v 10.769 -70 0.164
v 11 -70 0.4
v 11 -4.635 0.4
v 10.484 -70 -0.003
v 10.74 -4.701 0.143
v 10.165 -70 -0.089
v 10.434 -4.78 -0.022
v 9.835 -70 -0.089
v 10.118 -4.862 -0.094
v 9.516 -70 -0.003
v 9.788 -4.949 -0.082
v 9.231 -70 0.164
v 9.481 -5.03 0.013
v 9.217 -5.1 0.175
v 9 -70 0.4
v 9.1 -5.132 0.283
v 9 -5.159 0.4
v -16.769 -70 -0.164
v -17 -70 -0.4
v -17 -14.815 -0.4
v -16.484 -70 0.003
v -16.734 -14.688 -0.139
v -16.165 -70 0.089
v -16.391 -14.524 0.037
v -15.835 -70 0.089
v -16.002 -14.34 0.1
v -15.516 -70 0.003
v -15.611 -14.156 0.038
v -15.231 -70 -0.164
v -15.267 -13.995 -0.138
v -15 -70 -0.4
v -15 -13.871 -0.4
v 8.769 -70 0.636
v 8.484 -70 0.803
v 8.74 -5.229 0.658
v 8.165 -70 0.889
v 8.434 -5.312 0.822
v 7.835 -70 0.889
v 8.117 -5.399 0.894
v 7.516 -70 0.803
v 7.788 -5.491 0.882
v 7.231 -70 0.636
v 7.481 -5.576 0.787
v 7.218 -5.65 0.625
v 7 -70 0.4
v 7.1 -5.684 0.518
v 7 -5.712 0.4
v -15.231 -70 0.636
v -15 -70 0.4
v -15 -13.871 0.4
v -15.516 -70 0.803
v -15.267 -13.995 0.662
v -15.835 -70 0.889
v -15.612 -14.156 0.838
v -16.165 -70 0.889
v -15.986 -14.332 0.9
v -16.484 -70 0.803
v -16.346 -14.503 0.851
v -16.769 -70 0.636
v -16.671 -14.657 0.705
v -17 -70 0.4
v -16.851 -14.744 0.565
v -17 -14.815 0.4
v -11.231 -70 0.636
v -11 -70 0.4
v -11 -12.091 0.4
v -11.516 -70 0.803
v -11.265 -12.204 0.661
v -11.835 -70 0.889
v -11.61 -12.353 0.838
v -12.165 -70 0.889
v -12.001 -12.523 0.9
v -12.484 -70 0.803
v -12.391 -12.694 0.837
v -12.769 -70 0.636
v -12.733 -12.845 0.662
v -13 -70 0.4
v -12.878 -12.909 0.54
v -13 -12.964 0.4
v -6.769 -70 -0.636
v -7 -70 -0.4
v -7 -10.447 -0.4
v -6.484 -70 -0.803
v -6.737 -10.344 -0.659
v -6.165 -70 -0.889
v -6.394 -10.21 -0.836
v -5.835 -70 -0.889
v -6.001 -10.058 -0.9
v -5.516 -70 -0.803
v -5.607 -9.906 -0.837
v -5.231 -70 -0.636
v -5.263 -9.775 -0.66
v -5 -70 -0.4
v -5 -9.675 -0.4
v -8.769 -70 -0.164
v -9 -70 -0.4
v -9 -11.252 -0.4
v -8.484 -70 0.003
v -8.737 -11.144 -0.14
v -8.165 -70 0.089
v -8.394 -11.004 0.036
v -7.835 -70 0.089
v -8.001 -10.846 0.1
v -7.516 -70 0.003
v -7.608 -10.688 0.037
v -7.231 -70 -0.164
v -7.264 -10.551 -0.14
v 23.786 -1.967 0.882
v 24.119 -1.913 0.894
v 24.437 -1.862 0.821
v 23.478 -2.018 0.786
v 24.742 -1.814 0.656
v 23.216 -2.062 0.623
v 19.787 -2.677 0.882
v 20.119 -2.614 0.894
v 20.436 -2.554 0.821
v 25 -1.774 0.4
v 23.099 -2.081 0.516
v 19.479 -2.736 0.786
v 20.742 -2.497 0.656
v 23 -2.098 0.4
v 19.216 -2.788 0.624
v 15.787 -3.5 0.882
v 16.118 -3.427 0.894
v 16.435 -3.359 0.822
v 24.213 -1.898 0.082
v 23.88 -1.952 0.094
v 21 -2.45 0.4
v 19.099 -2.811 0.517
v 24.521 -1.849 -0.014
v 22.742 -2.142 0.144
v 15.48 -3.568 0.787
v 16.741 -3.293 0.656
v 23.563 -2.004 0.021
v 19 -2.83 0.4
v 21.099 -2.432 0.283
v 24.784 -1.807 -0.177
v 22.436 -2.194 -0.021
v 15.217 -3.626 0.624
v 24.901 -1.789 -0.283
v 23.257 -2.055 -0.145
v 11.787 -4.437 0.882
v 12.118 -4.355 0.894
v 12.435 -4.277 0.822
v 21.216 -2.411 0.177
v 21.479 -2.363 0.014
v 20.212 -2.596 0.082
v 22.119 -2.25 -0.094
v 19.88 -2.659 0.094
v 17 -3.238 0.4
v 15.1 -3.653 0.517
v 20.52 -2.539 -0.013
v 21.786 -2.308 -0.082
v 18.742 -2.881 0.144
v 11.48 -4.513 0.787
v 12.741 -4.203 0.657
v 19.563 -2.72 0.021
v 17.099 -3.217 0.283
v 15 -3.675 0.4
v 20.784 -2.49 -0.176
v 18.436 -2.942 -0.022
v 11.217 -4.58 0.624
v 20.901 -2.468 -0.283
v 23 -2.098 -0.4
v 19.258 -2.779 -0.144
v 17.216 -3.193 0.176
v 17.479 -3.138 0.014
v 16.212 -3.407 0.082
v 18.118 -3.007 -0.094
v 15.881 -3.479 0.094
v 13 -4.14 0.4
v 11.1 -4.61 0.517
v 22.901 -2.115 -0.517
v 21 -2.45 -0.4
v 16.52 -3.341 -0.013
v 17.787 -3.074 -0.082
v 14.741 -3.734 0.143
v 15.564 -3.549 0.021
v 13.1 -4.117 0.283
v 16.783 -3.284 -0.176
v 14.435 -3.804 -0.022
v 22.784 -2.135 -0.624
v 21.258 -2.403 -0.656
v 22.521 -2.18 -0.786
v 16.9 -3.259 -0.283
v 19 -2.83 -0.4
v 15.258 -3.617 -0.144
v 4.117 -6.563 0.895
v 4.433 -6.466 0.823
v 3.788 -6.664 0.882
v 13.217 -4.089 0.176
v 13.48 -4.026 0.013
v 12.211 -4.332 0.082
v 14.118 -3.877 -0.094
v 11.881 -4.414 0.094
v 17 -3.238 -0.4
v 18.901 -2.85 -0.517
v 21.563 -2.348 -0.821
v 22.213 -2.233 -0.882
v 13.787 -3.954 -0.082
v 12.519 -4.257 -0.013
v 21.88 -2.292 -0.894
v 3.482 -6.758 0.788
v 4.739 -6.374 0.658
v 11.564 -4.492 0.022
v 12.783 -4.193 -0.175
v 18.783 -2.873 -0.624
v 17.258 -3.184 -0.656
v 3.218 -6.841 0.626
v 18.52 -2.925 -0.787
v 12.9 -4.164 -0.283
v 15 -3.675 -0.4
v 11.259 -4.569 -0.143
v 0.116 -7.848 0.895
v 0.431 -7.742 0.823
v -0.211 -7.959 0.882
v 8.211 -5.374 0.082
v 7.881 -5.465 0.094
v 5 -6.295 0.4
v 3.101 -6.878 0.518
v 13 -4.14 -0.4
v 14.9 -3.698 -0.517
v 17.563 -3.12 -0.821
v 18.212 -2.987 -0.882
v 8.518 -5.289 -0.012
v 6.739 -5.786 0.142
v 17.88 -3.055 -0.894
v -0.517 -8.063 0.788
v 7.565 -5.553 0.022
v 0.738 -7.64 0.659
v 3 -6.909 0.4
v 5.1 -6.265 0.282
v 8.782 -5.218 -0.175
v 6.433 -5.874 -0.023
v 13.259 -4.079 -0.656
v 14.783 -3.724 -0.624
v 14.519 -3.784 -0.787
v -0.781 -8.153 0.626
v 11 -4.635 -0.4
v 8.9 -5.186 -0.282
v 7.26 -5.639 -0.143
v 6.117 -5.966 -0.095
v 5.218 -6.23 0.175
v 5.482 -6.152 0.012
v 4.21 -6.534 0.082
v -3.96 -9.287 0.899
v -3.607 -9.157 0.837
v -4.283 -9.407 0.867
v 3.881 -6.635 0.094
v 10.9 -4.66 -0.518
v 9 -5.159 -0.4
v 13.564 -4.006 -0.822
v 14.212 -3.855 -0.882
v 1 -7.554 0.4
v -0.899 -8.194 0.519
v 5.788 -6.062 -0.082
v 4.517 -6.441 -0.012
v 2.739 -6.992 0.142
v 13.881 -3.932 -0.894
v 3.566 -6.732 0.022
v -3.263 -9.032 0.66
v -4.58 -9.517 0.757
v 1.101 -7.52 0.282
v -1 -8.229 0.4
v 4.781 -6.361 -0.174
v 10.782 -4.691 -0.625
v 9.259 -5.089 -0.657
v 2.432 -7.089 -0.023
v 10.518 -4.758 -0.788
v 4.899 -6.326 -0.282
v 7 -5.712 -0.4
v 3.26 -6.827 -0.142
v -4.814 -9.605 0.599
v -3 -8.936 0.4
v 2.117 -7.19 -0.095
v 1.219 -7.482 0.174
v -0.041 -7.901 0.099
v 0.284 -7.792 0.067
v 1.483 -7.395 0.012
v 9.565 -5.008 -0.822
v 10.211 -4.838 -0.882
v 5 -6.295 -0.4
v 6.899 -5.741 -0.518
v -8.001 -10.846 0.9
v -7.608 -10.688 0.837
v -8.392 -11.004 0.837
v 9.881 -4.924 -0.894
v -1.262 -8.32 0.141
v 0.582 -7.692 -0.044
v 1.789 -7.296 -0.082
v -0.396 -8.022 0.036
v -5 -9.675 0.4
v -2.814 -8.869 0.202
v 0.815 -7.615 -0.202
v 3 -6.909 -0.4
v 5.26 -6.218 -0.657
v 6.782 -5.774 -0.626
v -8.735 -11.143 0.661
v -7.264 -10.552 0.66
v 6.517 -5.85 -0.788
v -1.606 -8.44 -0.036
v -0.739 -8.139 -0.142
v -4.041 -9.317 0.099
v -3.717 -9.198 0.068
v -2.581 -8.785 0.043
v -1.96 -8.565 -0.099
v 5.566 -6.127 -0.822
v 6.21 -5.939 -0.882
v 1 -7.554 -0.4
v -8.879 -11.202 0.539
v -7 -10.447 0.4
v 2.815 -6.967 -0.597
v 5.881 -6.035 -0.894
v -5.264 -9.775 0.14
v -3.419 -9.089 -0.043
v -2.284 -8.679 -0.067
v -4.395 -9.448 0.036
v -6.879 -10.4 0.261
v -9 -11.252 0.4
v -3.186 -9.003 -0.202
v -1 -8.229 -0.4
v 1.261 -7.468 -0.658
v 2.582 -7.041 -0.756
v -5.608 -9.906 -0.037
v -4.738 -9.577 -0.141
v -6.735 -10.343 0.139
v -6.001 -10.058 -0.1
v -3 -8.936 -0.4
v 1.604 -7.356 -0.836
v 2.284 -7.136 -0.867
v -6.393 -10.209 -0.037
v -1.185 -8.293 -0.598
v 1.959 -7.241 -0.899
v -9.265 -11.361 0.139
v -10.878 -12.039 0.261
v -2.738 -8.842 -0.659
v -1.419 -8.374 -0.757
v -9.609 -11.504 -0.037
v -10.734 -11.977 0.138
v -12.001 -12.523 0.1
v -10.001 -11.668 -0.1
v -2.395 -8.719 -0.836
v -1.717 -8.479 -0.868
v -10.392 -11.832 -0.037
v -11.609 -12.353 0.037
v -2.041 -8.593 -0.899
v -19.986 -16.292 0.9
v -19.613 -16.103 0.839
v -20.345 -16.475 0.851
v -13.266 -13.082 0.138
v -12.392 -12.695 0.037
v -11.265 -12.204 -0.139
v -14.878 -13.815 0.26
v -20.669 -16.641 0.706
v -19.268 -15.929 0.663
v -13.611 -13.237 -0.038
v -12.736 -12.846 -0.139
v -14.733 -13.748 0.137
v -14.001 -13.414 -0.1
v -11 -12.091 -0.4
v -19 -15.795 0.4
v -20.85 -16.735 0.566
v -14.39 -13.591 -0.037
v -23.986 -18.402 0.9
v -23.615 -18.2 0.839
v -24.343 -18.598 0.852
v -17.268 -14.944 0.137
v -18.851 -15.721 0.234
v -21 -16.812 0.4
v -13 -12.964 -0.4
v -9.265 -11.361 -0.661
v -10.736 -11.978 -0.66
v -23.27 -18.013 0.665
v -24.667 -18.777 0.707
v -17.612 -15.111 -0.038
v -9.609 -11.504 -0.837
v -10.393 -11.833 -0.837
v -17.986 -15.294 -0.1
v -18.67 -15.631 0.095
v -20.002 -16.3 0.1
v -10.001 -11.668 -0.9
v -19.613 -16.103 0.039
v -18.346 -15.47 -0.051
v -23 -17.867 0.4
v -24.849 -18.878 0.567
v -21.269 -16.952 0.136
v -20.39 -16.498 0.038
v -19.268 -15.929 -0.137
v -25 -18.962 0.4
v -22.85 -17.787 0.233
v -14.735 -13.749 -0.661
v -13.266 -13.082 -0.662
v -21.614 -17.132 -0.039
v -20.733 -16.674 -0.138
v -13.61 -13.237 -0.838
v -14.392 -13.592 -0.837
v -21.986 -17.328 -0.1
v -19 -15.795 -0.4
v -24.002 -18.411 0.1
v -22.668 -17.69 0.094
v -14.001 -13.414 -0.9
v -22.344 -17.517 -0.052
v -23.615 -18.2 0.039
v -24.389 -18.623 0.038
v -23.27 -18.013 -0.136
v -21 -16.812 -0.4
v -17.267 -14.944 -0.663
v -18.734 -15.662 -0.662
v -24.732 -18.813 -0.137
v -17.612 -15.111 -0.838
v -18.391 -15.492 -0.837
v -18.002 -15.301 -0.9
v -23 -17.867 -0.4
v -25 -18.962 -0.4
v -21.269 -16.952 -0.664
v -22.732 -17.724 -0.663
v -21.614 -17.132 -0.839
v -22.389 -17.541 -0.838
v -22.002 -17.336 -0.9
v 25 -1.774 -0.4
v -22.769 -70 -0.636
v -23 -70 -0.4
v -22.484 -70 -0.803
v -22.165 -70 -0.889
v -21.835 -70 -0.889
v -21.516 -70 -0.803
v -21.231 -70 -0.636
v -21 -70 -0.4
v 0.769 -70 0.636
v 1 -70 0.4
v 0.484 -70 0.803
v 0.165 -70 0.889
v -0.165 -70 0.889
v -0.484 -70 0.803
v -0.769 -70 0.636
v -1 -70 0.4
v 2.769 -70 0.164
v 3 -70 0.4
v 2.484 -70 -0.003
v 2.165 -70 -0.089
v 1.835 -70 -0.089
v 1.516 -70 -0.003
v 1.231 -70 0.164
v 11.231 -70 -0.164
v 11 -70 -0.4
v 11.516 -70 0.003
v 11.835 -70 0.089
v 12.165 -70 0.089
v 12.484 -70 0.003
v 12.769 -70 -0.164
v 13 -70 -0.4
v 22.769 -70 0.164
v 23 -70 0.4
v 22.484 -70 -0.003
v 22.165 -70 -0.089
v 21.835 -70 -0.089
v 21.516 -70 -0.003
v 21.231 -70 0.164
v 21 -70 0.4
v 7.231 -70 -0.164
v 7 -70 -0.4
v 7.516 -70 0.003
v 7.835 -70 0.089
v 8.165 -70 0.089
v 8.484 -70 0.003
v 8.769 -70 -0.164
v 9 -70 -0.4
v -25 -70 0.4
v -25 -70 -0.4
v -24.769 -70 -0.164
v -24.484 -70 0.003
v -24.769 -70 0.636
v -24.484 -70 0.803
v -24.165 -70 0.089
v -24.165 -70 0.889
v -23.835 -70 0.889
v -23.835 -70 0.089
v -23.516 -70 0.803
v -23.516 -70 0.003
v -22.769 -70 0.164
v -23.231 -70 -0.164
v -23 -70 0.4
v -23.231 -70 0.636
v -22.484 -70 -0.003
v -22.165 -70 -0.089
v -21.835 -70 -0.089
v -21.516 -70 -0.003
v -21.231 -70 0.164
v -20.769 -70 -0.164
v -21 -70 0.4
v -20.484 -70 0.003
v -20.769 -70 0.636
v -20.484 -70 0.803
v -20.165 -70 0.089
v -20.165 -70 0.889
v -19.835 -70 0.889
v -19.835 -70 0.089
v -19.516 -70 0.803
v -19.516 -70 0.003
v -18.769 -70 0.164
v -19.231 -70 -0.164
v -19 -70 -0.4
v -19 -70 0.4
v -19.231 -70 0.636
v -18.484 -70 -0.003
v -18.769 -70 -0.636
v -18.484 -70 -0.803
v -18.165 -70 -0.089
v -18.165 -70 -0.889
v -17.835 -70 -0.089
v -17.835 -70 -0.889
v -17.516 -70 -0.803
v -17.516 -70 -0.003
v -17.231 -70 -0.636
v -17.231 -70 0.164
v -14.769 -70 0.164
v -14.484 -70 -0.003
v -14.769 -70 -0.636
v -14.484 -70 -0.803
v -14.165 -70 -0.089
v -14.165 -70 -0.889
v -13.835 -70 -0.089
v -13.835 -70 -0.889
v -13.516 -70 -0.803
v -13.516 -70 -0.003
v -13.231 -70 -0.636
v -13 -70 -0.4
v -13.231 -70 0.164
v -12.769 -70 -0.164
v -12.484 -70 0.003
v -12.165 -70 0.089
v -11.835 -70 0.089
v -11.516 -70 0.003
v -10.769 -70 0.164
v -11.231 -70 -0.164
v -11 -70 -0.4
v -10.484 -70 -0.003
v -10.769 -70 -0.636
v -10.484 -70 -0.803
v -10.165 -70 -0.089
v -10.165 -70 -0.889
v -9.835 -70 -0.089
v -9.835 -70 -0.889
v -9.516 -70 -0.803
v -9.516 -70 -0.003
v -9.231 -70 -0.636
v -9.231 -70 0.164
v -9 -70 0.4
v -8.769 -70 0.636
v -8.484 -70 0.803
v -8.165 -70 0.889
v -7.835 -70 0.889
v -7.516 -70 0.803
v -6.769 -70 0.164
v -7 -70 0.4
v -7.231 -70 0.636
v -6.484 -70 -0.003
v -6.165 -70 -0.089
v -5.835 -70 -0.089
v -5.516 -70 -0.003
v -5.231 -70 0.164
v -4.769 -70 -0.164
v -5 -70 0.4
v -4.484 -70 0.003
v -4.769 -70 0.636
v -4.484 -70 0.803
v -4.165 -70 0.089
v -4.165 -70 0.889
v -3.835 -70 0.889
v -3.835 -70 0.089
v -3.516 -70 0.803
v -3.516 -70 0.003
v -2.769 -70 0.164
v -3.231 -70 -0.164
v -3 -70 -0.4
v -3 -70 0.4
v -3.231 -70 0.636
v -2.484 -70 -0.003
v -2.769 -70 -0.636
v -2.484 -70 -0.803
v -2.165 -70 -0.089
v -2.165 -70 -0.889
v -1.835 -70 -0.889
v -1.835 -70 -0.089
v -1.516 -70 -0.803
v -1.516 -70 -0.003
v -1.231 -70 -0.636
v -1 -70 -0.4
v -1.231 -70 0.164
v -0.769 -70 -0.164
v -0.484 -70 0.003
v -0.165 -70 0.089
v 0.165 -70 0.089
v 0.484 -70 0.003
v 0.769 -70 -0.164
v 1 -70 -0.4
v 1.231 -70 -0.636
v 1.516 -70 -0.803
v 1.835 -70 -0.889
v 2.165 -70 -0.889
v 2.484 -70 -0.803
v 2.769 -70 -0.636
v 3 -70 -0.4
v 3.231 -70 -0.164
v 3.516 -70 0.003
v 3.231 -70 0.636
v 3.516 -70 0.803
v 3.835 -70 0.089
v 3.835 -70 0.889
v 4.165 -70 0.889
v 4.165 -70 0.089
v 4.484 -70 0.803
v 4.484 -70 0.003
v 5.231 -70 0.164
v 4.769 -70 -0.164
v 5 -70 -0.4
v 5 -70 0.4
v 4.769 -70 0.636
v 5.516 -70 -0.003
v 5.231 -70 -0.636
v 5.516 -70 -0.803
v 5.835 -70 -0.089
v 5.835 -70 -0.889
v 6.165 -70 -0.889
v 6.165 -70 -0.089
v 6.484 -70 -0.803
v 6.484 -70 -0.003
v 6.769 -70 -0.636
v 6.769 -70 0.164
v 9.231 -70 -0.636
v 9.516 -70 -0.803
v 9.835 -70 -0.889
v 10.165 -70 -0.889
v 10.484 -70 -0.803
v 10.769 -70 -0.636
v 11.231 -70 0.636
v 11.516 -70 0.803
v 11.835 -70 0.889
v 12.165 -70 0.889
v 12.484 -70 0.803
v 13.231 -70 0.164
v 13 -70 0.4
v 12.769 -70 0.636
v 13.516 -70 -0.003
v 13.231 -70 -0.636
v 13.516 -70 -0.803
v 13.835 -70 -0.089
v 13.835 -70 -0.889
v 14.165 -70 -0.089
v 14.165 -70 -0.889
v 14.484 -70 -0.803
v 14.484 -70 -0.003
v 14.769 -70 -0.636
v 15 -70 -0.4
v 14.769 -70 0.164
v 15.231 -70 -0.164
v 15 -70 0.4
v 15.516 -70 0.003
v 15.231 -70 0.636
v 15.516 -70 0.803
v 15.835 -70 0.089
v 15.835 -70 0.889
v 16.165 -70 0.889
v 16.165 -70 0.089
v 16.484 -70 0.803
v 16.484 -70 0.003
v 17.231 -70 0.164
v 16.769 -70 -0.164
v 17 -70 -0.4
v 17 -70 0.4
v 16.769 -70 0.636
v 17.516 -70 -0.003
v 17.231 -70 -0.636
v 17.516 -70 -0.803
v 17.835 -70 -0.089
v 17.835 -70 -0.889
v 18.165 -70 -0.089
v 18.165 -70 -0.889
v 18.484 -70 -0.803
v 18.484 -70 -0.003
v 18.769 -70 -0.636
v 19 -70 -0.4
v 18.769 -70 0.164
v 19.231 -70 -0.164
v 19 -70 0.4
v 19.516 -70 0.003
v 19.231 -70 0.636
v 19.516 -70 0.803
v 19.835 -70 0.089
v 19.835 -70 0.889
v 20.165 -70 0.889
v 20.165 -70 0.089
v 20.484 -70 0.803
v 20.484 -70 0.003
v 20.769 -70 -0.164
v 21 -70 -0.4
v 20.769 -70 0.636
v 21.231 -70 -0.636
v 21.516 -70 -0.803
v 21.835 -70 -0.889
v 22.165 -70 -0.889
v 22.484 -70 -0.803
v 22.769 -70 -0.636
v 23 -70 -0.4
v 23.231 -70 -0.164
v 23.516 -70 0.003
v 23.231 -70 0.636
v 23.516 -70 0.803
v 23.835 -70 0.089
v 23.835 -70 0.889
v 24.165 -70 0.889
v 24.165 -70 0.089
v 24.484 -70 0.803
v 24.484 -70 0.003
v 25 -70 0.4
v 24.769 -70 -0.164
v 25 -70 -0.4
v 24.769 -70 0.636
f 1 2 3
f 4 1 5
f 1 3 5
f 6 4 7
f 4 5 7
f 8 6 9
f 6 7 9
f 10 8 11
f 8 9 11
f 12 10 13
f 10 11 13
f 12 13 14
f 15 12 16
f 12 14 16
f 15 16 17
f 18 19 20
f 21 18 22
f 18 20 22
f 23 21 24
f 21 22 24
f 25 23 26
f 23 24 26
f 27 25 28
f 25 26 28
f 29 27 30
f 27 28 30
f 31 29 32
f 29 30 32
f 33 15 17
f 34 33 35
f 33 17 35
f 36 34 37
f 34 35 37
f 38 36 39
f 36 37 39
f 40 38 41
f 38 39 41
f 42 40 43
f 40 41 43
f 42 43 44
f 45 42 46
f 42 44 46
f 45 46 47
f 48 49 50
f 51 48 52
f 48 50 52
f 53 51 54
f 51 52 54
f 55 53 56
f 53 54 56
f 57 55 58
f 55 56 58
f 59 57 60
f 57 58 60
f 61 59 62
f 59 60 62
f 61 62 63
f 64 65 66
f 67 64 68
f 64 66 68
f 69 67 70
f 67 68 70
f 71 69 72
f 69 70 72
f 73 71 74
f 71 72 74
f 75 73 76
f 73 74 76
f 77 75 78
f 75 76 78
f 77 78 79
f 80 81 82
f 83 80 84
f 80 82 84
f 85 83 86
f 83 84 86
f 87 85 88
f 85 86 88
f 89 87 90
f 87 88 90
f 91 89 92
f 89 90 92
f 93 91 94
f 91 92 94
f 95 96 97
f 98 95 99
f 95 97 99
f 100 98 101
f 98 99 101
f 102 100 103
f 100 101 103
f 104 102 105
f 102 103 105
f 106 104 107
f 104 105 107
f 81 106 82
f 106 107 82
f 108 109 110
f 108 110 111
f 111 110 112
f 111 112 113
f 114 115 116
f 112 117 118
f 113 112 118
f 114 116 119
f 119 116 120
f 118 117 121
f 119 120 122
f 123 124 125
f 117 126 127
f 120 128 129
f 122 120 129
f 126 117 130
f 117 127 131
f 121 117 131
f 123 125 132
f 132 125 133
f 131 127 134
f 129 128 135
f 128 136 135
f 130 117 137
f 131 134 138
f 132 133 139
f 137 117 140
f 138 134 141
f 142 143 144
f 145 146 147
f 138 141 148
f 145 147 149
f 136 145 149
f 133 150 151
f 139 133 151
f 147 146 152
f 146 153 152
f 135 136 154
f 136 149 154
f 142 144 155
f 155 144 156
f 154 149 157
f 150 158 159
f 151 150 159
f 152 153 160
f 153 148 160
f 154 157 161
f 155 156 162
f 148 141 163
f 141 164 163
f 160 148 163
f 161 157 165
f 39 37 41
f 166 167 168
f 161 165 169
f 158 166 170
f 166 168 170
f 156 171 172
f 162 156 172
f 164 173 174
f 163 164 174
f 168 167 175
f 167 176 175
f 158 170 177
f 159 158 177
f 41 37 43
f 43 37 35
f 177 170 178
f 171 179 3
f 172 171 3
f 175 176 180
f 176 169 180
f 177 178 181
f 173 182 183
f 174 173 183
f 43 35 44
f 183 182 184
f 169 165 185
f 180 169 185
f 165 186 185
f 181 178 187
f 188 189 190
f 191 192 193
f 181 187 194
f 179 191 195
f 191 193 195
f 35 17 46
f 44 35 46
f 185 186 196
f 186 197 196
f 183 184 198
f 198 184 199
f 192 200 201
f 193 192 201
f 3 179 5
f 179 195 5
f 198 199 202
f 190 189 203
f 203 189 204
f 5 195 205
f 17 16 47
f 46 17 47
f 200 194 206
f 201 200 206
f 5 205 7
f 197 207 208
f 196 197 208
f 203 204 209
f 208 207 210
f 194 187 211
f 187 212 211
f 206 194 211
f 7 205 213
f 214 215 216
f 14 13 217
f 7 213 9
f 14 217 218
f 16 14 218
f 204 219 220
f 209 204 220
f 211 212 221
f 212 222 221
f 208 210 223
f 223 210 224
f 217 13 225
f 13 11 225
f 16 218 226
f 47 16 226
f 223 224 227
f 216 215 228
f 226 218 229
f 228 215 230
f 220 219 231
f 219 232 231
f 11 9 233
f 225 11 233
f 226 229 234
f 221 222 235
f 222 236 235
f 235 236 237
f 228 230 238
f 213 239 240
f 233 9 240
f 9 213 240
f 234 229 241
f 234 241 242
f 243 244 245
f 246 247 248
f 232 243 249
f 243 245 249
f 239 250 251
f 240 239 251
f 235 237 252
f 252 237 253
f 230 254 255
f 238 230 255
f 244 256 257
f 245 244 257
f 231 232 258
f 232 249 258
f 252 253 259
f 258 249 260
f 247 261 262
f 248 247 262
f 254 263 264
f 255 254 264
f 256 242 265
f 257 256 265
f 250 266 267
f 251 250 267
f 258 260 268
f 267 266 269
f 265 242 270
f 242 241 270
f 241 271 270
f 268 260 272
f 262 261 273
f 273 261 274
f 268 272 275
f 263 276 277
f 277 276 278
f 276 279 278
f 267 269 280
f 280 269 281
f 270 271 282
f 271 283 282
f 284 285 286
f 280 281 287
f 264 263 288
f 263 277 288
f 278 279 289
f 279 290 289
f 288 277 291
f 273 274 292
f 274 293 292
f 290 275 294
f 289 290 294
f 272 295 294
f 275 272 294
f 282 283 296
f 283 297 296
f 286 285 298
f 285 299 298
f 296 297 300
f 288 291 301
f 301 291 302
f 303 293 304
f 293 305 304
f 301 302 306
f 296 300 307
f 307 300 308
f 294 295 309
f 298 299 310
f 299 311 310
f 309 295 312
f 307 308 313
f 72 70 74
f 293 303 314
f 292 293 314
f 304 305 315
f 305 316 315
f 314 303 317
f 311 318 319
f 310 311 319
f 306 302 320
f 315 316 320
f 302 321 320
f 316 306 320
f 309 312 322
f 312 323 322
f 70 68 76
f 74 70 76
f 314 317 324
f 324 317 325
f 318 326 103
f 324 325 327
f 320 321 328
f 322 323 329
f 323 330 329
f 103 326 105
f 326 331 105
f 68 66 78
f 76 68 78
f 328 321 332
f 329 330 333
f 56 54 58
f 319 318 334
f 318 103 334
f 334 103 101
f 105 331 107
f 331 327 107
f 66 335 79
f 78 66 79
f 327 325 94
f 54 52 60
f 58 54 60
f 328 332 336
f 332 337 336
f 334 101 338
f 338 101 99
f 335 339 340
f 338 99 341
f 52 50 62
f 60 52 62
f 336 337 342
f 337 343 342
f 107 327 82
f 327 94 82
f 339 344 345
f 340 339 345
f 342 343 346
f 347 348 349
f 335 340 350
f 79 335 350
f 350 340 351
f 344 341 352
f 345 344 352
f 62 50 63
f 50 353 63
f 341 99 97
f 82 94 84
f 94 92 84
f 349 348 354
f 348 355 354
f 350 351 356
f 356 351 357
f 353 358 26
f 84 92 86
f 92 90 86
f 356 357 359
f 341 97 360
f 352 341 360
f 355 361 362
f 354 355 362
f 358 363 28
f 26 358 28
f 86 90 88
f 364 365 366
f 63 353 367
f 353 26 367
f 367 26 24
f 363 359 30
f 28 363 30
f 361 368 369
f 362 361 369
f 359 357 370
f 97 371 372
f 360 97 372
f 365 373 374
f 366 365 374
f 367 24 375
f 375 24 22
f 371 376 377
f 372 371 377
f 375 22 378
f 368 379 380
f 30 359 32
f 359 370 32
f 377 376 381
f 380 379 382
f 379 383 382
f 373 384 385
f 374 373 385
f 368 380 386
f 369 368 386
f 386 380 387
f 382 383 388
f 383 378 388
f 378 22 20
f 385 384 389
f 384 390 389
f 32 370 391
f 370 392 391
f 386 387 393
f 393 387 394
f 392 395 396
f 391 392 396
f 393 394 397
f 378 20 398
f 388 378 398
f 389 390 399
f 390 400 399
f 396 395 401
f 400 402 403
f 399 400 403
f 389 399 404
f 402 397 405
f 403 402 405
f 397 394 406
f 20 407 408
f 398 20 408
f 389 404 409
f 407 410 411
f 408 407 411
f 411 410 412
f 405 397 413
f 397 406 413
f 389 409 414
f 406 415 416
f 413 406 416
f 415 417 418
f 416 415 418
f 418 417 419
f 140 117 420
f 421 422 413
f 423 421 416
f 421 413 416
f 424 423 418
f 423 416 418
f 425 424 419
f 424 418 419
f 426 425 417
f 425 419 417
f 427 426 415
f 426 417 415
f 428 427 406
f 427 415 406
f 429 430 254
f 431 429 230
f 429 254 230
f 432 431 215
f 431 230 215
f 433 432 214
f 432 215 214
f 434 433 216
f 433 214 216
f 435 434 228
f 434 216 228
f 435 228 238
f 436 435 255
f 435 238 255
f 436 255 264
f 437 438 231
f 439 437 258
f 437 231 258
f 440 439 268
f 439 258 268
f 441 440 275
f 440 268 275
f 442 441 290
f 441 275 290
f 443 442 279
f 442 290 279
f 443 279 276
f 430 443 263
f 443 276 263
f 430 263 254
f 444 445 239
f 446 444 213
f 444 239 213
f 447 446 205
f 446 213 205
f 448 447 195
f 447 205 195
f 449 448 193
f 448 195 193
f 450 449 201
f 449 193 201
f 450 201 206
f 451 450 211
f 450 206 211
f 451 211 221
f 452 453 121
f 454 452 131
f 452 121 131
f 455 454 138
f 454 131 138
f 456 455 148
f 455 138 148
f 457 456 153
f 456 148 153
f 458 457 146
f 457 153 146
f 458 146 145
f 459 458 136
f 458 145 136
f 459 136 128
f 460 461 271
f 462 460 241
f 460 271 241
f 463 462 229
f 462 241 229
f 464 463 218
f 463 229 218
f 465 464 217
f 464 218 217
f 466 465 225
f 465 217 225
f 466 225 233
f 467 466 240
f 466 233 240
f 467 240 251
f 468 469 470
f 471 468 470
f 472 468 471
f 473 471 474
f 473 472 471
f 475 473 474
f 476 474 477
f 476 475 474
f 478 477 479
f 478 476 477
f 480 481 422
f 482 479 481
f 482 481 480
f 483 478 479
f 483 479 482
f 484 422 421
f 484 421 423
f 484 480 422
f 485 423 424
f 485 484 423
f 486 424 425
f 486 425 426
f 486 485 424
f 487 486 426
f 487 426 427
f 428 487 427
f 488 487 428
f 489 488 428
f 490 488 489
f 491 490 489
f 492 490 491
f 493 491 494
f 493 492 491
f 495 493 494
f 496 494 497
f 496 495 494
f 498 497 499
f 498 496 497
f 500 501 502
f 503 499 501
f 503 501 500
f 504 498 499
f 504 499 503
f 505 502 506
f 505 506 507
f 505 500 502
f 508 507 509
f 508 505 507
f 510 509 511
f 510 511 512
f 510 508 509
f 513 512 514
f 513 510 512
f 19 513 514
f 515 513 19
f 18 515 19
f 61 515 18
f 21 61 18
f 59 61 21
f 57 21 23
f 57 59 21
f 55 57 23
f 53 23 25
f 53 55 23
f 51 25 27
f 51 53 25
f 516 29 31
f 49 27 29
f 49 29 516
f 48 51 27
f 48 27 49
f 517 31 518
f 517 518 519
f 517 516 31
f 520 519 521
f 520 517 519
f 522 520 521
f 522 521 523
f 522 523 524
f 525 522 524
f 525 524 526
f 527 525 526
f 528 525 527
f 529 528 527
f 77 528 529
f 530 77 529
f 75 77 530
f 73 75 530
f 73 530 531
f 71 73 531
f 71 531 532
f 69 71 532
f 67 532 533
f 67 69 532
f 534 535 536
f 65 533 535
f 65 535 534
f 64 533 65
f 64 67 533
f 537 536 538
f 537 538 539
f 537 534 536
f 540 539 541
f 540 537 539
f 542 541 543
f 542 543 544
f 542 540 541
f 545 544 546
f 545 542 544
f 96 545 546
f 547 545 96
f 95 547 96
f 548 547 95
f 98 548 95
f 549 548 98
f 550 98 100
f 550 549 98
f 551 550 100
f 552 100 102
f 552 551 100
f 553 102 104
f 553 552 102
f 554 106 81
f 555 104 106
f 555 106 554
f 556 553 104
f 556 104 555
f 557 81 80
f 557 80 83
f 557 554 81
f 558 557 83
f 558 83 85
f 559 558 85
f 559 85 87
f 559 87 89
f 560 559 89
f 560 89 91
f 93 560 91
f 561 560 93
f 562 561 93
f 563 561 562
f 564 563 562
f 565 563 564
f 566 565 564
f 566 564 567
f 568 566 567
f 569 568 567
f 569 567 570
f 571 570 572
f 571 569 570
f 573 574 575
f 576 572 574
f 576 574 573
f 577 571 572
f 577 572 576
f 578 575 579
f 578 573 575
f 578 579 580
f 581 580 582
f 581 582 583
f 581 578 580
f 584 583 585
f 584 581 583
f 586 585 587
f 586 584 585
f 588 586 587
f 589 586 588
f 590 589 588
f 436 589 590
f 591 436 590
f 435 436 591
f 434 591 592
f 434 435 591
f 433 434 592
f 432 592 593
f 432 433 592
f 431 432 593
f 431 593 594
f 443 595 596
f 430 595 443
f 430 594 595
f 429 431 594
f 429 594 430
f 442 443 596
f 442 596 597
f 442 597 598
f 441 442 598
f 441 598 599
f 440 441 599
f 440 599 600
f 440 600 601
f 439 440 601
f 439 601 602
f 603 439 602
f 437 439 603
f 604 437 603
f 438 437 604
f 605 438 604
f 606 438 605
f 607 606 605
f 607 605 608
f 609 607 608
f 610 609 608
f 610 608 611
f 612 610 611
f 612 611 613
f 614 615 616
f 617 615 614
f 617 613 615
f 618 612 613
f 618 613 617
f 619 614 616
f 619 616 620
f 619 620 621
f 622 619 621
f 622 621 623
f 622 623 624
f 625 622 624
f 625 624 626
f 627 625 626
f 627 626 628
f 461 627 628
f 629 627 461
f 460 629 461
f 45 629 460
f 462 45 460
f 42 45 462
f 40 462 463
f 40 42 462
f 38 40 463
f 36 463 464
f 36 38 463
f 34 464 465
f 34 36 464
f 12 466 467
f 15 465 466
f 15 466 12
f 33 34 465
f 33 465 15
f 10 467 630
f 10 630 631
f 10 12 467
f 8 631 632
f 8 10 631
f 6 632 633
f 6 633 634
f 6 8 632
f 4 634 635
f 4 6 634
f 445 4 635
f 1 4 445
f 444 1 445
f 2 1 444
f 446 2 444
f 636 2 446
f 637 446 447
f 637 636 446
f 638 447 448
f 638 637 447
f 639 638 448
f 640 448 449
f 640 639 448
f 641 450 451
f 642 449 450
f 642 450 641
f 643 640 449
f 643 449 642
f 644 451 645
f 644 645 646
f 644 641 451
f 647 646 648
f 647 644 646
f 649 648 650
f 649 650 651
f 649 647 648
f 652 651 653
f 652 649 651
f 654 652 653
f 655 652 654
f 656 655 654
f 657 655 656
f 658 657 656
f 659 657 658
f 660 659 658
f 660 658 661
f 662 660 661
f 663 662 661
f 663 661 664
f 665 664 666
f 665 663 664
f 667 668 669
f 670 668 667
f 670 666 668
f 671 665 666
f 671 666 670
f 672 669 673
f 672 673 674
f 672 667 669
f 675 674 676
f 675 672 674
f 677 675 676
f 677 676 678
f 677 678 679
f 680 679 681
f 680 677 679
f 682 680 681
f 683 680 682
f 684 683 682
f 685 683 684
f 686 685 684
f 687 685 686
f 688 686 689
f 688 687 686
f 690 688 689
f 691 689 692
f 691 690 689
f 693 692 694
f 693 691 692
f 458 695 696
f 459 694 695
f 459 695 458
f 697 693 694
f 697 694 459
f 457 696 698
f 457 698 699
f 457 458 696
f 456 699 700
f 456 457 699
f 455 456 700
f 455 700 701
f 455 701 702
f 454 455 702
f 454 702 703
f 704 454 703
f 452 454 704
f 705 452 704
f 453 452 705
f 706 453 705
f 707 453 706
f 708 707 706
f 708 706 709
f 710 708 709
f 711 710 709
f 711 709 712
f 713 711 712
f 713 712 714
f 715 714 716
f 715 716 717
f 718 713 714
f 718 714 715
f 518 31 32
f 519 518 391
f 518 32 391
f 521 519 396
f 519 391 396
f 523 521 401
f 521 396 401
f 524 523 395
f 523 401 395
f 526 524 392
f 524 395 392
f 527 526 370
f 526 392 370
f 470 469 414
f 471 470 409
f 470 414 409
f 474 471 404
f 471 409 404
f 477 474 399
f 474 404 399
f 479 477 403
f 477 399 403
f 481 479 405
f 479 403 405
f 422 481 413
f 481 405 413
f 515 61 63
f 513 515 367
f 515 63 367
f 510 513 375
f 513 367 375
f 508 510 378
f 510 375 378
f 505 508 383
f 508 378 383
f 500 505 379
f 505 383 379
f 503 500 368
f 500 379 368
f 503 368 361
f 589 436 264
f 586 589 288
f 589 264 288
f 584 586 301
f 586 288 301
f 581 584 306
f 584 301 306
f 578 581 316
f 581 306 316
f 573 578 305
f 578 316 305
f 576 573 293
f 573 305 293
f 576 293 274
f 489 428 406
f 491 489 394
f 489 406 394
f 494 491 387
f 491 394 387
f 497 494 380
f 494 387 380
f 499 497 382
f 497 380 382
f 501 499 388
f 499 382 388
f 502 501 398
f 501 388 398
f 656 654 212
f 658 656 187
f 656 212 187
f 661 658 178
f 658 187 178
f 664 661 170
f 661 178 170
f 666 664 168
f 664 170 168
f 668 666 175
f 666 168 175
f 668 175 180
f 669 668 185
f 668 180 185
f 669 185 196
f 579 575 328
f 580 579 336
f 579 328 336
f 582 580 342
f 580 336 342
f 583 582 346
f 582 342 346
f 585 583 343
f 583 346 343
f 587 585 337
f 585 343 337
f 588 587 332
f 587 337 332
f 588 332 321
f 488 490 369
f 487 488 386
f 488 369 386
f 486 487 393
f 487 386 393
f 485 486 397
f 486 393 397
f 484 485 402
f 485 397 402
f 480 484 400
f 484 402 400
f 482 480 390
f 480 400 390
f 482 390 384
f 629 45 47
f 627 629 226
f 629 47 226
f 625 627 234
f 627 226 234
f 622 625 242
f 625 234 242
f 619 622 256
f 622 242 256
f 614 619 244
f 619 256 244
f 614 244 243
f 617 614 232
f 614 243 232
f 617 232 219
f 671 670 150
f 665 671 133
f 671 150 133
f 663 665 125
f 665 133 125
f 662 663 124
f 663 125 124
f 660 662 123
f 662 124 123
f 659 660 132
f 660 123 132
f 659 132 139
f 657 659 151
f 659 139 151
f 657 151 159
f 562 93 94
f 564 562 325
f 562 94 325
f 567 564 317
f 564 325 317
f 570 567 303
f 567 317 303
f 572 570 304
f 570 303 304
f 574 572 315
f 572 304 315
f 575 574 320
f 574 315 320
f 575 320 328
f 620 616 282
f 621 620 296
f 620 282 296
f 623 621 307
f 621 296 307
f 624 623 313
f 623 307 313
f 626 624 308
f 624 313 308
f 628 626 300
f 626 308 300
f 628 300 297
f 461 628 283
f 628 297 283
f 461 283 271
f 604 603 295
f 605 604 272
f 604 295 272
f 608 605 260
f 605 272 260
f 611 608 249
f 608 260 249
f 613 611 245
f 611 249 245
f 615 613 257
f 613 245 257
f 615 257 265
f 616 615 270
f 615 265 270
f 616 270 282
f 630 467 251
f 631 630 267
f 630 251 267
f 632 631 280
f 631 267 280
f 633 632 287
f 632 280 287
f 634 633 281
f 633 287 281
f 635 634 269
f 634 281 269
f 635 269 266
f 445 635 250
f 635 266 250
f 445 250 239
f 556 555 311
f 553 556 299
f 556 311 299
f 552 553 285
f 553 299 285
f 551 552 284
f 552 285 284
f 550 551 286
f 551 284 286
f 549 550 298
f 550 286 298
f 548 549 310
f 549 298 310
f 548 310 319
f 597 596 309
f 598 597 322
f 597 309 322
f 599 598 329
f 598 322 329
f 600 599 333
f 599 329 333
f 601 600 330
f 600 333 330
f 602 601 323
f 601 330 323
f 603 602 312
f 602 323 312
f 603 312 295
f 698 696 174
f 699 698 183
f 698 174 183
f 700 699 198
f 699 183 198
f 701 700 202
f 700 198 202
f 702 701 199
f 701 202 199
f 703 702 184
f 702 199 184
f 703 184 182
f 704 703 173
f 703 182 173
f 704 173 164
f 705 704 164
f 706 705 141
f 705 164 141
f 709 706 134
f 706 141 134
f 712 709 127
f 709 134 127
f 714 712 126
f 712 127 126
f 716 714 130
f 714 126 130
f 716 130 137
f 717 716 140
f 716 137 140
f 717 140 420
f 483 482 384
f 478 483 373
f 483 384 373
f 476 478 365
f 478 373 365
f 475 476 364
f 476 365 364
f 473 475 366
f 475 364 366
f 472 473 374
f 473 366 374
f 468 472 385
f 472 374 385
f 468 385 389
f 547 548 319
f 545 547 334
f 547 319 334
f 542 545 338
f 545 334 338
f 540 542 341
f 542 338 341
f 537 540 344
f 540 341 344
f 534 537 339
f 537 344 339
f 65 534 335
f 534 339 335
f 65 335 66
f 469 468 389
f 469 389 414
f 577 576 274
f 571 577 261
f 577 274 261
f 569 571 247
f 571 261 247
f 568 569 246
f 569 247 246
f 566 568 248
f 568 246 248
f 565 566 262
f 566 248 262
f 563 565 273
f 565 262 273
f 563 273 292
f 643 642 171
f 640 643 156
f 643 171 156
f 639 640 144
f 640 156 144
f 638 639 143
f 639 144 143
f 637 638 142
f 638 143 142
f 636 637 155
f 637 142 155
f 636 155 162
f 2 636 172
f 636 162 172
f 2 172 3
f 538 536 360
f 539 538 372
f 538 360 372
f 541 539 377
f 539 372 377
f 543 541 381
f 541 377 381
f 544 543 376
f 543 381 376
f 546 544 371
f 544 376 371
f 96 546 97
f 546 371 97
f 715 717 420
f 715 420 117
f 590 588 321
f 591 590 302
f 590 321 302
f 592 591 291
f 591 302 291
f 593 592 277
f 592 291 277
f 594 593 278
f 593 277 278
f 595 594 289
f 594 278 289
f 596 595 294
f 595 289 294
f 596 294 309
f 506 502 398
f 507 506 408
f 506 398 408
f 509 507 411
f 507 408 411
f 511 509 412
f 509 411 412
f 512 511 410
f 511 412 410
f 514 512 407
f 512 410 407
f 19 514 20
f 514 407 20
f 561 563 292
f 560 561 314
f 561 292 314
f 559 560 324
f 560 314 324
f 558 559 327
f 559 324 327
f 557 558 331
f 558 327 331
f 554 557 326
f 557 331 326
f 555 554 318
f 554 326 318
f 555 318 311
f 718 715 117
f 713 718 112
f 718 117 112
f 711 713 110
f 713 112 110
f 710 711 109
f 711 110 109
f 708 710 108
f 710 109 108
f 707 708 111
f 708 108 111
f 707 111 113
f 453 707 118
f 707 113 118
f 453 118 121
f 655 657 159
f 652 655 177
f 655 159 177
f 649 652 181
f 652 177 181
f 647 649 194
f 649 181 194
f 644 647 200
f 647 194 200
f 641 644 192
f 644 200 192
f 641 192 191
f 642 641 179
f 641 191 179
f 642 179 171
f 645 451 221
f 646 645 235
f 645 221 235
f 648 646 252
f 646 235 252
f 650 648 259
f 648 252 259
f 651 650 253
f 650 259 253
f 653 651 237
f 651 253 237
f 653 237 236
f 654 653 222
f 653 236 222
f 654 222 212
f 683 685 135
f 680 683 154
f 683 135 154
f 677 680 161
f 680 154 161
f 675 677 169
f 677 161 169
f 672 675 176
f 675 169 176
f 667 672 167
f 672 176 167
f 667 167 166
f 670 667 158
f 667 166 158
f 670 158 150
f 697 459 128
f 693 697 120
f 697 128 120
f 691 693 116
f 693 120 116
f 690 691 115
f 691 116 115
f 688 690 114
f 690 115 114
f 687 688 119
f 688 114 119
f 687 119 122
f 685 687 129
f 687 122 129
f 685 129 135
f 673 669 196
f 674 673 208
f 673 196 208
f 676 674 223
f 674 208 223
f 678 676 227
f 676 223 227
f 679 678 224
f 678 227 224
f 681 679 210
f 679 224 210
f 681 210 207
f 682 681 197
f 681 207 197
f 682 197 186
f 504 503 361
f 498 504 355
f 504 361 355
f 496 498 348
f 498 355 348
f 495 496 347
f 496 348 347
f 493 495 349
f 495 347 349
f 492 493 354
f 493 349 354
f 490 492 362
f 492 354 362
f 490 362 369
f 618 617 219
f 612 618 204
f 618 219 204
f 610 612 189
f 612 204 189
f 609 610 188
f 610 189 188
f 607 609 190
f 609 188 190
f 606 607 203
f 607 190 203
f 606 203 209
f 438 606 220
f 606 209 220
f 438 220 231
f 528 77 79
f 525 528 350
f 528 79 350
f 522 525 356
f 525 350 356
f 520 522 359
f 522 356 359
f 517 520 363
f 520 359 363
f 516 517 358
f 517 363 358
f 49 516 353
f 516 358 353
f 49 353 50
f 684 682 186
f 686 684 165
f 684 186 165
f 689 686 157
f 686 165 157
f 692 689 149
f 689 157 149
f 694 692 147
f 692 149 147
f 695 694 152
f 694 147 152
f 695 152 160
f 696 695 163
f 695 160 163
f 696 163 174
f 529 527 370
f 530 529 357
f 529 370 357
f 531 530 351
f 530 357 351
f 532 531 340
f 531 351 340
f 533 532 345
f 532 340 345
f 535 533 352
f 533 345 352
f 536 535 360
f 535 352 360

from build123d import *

# Parameters (mm, degrees)
F1_DEPTH = 70
F3_START = -25
F2_R     = 150
F3_DEPTH = 50


with BuildPart() as f1:
    # F0 (on Front) → F1 (new body)
    with BuildSketch(Plane.XZ):
        with BuildLine():
            ThreePointArc((-21, -0.4), (-20, 0.1), (-19, -0.4))
            ThreePointArc((-19, -0.4), (-18, -0.9), (-17, -0.4))
            ThreePointArc((-17, -0.4), (-16, 0.1), (-15, -0.4))
            ThreePointArc((-15, -0.4), (-14, -0.9), (-13, -0.4))
            ThreePointArc((-13, -0.4), (-12, 0.1), (-11, -0.4))
            ThreePointArc((-11, -0.4), (-10, -0.9), (-9, -0.4))
            ThreePointArc((-9, -0.4), (-8, 0.1), (-7, -0.4))
            ThreePointArc((-7, -0.4), (-6, -0.9), (-5, -0.4))
            ThreePointArc((-5, -0.4), (-4, 0.1), (-3, -0.4))
            ThreePointArc((-3, -0.4), (-2, -0.9), (-1, -0.4))
            ThreePointArc((-1, -0.4), (0, 0.1), (1, -0.4))
            ThreePointArc((1, -0.4), (2, -0.9), (3, -0.4))
            ThreePointArc((3, -0.4), (4, 0.1), (5, -0.4))
            ThreePointArc((5, -0.4), (6, -0.9), (7, -0.4))
            ThreePointArc((7, -0.4), (8, 0.1), (9, -0.4))
            ThreePointArc((9, -0.4), (10, -0.9), (11, -0.4))
            ThreePointArc((11, -0.4), (12, 0.1), (13, -0.4))
            ThreePointArc((13, -0.4), (14, -0.9), (15, -0.4))
            ThreePointArc((15, -0.4), (16, 0.1), (17, -0.4))
            ThreePointArc((17, -0.4), (18, -0.9), (19, -0.4))
            ThreePointArc((19, -0.4), (20, 0.1), (21, -0.4))
            ThreePointArc((21, -0.4), (22, -0.9), (23, -0.4))
            ThreePointArc((23, -0.4), (24, 0.1), (25, -0.4))
            Line((25, -0.4), (25, 0.4))
            ThreePointArc((25, 0.4), (24, 0.9), (23, 0.4))
            ThreePointArc((23, 0.4), (22, -0.1), (21, 0.4))
            ThreePointArc((21, 0.4), (20, 0.9), (19, 0.4))
            ThreePointArc((19, 0.4), (18, -0.1), (17, 0.4))
            ThreePointArc((17, 0.4), (16, 0.9), (15, 0.4))
            ThreePointArc((15, 0.4), (14, -0.1), (13, 0.4))
            ThreePointArc((13, 0.4), (12, 0.9), (11, 0.4))
            ThreePointArc((11, 0.4), (10, -0.1), (9, 0.4))
            ThreePointArc((9, 0.4), (8, 0.9), (7, 0.4))
            ThreePointArc((7, 0.4), (6, -0.1), (5, 0.4))
            ThreePointArc((5, 0.4), (4, 0.9), (3, 0.4))
            ThreePointArc((3, 0.4), (2, -0.1), (1, 0.4))
            ThreePointArc((1, 0.4), (0, 0.9), (-1, 0.4))
            ThreePointArc((-1, 0.4), (-2, -0.1), (-3, 0.4))
            ThreePointArc((-3, 0.4), (-4, 0.9), (-5, 0.4))
            ThreePointArc((-5, 0.4), (-6, -0.1), (-7, 0.4))
            ThreePointArc((-7, 0.4), (-8, 0.9), (-9, 0.4))
            ThreePointArc((-9, 0.4), (-10, -0.1), (-11, 0.4))
            ThreePointArc((-11, 0.4), (-12, 0.9), (-13, 0.4))
            ThreePointArc((-13, 0.4), (-14, -0.1), (-15, 0.4))
            ThreePointArc((-15, 0.4), (-16, 0.9), (-17, 0.4))
            ThreePointArc((-17, 0.4), (-18, -0.1), (-19, 0.4))
            ThreePointArc((-19, 0.4), (-20, 0.9), (-21, 0.4))
            ThreePointArc((-21, 0.4), (-22, -0.1), (-23, 0.4))
            ThreePointArc((-23, 0.4), (-24, 0.9), (-25, 0.4))
            Line((-25, 0.4), (-25, -0.4))
            ThreePointArc((-25, -0.4), (-24, 0.1), (-23, -0.4))
            ThreePointArc((-23, -0.4), (-22, -0.9), (-21, -0.4))
        make_face()
    extrude(amount=F1_DEPTH)

    # F2 (on Top) → F3 (intersect)
    with BuildSketch(Plane.XY.offset(F3_START)):
        with Locations((48, -150)):
            Circle(F2_R)
    extrude(amount=F3_DEPTH, mode=Mode.INTERSECT)


solid = f1.part
